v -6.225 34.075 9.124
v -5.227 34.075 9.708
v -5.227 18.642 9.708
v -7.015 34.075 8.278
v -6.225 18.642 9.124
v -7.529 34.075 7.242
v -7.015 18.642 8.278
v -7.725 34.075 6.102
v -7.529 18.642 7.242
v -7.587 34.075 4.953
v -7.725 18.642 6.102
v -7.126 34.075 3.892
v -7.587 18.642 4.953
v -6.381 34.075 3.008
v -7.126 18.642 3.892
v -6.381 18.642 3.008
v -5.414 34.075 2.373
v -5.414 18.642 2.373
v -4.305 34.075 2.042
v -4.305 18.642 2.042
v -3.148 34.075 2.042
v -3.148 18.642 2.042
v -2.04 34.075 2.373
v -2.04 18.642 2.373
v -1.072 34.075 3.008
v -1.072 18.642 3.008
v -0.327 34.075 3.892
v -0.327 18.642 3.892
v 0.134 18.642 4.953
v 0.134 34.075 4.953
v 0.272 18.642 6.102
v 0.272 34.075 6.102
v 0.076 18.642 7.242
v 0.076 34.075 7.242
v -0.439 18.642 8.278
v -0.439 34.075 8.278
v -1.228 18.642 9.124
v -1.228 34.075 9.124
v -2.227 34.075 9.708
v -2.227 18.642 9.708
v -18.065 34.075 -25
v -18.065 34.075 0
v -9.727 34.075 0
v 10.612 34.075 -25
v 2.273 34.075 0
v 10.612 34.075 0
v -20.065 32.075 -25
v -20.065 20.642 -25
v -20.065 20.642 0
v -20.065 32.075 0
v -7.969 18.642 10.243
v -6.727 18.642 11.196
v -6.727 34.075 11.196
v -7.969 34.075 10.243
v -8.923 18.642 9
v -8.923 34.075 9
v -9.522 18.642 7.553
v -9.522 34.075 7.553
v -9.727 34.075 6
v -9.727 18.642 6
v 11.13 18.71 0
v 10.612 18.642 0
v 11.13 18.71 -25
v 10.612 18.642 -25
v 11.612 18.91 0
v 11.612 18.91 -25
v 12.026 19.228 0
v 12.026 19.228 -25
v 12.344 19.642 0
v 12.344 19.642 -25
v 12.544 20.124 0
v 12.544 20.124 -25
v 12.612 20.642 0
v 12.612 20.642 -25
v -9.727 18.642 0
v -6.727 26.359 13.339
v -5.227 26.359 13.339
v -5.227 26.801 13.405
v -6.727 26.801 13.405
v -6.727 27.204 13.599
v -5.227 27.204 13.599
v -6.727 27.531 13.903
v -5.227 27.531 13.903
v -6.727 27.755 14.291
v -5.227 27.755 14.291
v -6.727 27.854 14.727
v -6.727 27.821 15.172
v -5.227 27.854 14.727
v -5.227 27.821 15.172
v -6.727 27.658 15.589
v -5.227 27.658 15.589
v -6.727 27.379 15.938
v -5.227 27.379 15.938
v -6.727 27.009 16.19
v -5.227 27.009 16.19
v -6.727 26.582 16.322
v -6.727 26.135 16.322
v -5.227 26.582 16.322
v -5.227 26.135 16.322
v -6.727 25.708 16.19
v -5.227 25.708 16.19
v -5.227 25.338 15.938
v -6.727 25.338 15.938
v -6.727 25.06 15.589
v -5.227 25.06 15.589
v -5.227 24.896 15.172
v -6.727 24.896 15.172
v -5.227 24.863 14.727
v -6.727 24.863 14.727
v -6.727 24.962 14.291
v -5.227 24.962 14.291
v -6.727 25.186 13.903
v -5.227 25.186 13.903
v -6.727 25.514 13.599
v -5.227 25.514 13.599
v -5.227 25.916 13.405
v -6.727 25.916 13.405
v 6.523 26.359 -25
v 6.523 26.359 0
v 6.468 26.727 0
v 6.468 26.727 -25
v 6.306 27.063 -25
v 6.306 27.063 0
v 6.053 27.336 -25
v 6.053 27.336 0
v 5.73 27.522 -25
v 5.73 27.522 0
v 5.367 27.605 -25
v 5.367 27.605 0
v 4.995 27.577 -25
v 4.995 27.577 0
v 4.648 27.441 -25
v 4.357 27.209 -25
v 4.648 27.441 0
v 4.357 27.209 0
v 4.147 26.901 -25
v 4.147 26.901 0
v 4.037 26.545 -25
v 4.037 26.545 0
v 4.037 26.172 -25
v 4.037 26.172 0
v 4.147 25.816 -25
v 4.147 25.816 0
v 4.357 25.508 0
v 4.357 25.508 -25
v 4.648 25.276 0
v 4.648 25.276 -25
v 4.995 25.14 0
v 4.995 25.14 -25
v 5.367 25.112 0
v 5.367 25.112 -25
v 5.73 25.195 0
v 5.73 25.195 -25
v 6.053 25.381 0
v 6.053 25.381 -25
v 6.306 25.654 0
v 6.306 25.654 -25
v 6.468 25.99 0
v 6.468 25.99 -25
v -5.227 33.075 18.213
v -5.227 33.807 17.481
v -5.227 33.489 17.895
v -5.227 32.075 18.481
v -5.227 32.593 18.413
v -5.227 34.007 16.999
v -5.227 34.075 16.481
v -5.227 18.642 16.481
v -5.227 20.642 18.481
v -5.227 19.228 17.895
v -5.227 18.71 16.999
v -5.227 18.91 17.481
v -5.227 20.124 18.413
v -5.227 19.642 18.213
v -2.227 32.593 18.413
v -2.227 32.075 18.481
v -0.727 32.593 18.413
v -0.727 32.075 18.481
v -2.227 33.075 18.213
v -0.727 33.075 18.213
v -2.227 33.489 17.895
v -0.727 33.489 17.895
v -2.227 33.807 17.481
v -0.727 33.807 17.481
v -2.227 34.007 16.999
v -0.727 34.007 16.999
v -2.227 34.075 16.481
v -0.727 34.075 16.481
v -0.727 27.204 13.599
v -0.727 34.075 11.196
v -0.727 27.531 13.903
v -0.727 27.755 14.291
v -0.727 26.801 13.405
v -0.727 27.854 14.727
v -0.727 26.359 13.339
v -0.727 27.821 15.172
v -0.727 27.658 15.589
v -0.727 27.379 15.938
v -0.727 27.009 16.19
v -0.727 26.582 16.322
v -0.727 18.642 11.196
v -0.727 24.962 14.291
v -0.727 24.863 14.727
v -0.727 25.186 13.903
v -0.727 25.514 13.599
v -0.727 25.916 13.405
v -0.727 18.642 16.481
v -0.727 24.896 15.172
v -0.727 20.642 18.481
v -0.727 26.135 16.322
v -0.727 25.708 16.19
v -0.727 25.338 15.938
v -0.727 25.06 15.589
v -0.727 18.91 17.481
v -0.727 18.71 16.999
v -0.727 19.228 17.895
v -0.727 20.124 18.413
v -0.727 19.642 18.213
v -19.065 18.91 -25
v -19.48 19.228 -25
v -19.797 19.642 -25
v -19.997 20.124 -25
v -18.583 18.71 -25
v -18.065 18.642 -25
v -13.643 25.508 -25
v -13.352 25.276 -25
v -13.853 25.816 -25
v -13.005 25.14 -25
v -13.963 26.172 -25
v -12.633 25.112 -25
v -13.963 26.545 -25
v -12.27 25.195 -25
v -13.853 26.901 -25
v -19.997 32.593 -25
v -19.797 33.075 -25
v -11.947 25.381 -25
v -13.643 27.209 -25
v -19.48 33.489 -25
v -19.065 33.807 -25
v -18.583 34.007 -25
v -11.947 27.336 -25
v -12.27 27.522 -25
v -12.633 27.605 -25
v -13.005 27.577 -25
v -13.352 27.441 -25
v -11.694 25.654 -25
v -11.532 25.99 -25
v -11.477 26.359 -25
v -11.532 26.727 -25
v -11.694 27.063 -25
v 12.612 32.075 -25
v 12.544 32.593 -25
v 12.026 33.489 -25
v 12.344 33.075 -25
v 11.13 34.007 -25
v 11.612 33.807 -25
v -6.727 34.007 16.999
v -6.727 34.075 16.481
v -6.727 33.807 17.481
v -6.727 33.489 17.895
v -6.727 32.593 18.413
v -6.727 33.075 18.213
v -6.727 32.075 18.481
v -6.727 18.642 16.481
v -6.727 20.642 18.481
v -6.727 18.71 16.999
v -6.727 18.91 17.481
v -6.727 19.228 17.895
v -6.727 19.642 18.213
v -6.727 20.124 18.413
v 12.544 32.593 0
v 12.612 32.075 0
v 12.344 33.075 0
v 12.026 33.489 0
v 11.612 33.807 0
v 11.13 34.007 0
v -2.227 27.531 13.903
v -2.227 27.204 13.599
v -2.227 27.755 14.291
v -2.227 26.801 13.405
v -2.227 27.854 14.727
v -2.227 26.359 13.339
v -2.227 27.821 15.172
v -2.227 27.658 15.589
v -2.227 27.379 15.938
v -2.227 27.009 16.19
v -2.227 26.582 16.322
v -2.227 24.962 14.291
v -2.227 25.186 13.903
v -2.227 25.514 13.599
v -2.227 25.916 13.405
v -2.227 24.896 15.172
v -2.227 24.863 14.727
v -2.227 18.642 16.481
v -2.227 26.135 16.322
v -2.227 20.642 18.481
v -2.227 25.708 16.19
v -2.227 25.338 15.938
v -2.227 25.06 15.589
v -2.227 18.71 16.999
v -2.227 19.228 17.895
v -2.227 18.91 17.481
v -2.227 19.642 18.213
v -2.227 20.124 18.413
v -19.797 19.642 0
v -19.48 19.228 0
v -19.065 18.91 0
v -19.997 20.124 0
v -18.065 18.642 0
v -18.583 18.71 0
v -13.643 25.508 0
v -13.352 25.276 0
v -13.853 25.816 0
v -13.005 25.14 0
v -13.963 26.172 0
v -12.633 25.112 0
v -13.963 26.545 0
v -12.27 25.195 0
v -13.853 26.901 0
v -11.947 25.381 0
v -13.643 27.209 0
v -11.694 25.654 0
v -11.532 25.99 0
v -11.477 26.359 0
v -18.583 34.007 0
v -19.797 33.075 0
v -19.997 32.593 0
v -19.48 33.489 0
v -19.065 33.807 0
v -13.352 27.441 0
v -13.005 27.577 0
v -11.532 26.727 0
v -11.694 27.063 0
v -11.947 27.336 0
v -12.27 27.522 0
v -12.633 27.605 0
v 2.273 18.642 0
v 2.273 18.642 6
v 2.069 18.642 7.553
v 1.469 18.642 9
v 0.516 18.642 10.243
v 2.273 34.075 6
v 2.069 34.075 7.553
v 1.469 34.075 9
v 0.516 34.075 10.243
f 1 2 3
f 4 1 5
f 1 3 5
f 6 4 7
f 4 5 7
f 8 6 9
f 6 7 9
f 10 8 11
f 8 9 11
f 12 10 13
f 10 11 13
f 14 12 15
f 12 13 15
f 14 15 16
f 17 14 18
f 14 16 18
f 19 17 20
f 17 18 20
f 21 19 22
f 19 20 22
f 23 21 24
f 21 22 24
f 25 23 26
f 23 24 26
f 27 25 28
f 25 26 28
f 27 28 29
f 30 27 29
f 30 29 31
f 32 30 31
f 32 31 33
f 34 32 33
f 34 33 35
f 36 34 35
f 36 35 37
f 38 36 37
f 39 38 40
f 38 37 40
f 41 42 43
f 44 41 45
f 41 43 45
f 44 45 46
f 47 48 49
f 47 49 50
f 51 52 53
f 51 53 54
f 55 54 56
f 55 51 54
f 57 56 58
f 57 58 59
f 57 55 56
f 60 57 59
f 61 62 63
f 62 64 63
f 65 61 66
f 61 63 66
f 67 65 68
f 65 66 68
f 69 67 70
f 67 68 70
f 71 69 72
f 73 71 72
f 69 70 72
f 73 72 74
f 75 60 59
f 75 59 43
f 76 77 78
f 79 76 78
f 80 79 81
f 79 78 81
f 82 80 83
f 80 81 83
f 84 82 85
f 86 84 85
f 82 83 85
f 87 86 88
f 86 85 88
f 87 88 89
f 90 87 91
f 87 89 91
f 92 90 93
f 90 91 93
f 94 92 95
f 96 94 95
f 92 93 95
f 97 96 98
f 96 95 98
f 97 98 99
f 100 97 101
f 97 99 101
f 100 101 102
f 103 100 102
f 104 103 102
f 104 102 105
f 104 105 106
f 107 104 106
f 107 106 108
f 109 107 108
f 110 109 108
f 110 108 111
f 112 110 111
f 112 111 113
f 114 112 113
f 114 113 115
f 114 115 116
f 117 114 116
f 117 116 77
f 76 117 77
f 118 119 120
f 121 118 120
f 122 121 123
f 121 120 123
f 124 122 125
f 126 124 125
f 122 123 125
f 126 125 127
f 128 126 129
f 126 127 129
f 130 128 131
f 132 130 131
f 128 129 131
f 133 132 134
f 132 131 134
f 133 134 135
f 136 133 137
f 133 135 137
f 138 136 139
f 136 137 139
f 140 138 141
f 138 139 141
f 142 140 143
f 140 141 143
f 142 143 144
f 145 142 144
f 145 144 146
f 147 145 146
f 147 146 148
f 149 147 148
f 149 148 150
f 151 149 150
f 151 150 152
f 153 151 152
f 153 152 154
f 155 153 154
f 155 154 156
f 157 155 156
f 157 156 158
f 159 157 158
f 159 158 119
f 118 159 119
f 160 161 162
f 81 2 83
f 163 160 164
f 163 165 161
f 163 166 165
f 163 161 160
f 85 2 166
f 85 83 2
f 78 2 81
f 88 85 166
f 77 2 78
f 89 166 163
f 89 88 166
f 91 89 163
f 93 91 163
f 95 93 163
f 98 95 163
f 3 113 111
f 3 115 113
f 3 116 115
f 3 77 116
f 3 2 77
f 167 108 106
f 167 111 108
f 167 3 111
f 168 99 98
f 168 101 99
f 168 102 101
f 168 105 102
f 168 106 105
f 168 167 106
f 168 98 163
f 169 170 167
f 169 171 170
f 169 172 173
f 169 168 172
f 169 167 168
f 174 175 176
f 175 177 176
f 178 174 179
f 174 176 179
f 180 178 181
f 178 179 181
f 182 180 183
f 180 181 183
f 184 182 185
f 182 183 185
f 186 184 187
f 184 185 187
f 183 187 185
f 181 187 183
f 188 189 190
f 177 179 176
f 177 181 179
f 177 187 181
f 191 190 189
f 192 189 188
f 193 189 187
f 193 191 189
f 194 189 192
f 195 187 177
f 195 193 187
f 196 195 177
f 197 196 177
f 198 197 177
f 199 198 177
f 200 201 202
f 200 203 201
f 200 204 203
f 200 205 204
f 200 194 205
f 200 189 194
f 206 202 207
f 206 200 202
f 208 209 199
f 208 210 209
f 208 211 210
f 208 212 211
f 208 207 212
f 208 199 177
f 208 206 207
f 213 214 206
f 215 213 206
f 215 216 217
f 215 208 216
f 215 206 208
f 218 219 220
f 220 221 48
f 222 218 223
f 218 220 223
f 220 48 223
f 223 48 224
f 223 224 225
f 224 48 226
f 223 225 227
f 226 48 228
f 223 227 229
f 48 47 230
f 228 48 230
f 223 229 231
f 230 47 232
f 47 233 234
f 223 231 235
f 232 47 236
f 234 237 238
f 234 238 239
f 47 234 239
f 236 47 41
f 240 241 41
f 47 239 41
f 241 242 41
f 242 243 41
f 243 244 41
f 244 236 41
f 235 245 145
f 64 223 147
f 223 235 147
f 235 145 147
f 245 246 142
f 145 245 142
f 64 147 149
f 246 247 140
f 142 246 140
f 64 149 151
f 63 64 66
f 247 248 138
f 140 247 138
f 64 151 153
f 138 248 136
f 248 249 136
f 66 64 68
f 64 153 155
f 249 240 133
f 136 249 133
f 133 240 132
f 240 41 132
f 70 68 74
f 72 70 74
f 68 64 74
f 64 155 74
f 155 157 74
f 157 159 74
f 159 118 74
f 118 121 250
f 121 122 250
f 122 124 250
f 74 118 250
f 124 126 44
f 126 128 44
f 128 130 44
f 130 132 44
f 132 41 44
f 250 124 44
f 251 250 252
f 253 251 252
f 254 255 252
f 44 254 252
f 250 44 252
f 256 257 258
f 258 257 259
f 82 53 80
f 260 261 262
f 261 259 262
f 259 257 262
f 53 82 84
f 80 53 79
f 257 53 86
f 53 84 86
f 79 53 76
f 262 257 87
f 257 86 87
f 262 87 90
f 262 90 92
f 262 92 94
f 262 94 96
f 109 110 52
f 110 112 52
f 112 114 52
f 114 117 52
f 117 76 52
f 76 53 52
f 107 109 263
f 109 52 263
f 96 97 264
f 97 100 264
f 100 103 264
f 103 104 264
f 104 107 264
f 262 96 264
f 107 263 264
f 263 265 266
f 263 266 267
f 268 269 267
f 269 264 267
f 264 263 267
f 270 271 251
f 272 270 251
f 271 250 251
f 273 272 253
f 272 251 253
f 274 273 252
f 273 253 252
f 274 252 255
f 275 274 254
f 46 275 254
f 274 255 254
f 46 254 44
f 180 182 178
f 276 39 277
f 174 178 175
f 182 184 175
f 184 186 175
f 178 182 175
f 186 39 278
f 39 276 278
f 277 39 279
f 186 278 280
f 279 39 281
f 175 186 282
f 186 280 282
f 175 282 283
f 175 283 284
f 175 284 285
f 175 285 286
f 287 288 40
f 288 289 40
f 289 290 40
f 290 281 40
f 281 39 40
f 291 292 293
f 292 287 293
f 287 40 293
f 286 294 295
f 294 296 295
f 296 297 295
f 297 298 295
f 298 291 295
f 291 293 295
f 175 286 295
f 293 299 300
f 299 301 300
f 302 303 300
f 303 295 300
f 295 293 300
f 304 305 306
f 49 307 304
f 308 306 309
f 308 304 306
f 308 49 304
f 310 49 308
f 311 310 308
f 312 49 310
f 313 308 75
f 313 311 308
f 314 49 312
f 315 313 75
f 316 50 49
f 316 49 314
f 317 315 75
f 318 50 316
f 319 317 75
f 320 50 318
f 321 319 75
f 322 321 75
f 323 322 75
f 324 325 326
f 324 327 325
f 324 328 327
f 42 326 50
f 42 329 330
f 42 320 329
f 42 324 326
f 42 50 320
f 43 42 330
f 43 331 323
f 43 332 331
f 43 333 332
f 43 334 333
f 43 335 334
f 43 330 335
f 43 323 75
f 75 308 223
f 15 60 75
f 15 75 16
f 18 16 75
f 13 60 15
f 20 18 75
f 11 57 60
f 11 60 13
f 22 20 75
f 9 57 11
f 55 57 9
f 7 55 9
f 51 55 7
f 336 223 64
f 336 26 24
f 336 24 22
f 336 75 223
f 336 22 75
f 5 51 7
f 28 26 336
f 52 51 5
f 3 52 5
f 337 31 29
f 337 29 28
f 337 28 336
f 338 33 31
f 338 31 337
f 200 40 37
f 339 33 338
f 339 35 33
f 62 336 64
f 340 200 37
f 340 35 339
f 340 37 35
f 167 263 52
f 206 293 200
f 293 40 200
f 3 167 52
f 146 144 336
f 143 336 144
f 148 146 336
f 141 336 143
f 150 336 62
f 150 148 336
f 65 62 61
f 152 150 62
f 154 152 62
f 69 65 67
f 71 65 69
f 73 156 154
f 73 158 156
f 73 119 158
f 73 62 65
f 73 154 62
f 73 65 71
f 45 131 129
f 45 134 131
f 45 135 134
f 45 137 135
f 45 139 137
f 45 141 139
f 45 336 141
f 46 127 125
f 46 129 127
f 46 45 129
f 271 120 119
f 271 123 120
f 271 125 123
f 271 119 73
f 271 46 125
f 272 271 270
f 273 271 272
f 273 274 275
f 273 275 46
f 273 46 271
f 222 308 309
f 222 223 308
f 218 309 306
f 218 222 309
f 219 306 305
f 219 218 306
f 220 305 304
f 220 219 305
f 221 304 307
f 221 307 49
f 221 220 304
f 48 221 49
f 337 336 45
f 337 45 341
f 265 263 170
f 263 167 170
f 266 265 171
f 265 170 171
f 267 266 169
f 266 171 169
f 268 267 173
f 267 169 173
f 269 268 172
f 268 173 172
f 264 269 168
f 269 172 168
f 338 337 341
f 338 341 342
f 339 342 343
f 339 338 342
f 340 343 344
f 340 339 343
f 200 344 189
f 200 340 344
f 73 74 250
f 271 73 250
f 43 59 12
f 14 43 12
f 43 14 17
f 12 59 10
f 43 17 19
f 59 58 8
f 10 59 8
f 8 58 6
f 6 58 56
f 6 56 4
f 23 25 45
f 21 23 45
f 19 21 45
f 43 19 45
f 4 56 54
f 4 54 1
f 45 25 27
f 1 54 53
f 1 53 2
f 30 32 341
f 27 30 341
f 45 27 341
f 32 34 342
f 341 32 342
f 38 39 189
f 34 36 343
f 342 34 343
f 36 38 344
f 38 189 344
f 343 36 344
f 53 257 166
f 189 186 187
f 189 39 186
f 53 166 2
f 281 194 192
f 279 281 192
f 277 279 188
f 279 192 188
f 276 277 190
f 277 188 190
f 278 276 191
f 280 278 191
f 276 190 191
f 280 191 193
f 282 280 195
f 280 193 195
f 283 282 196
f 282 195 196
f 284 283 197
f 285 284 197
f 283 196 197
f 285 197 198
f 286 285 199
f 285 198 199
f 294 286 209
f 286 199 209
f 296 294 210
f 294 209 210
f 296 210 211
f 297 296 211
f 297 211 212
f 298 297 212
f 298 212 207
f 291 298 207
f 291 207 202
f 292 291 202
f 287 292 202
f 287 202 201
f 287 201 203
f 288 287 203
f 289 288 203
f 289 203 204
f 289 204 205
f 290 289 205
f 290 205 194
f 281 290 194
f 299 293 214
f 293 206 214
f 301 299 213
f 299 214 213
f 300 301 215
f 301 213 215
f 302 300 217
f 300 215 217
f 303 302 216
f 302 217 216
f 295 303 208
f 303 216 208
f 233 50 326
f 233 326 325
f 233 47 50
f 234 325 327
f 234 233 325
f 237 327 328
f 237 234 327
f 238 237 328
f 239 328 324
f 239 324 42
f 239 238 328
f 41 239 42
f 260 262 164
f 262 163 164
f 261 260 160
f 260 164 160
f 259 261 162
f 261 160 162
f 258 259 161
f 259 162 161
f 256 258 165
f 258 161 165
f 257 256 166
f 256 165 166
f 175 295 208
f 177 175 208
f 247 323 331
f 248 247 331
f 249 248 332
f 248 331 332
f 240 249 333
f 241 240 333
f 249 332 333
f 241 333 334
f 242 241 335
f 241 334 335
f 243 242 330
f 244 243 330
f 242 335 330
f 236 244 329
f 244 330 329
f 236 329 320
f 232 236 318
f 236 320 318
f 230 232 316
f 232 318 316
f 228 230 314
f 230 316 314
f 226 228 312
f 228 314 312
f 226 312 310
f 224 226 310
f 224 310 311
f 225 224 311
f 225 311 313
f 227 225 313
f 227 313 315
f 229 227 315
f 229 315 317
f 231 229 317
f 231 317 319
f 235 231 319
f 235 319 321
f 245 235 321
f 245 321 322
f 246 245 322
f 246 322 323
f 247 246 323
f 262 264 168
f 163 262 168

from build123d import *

# Parameters (mm, degrees)
SKETCH_1_W          = 32.677388302
SKETCH_1_H          = 15.432977872
EXTRUDE_1_DEPTH     = 25
SKETCH_2_R          = 1.25
CUT_EXTRUDE_1_DEPTH = 26
SKETCH_3_R          = 6
EXTRUDE_2_DEPTH     = 15.432978
SKETCH_4_R          = 4
CUT_EXTRUDE_2_DEPTH = 16.432978
EXTRUDE_3_DEPTH     = 15.432978
SKETCH_6_W          = 6
SKETCH_6_H          = 8.481168663
EXTRUDE_4_DEPTH     = 15.432978
SKETCH_8_W          = 3
SKETCH_8_H          = 25.378391716
CUT_EXTRUDE_5_DEPTH = 16.432978
SKETCH_9_R          = 1.5
CUT_EXTRUDE_6_DEPTH = 20.338694151
FILLET_1_R          = 2
FILLET_2_R          = 2


with BuildPart() as part:
    # 草图1 → 凸台-拉伸1 (new body)
    with BuildSketch(Plane.XY):
        with Locations((-3.726697353, 26.358574689)):
            Rectangle(SKETCH_1_W, SKETCH_1_H)
    extrude(amount=-EXTRUDE_1_DEPTH)

    # 草图2 → 切除-拉伸1 (cut, through all)
    with BuildSketch(Plane.XY):
        with Locations((-12.726697353, 26.358574689)):
            Circle(SKETCH_2_R)
        with Locations((5.273302647, 26.358574689)):
            Circle(SKETCH_2_R)
    extrude(amount=-CUT_EXTRUDE_1_DEPTH, mode=Mode.SUBTRACT)



with BuildPart() as body_2:
    # 草图3 → 凸台-拉伸2 (new body)
    with BuildSketch(Plane.XZ.offset(-18.642085753)):
        with Locations((-3.726697353, 6)):
            Circle(SKETCH_3_R)
    extrude(amount=-EXTRUDE_2_DEPTH)

    # 草图4 → 切除-拉伸2 (cut, through all)
    with BuildSketch(Plane.XZ.offset(-18.642085753)):
        with Locations((-3.726697353, 6)):
            Circle(SKETCH_4_R)
    extrude(amount=-CUT_EXTRUDE_2_DEPTH, mode=Mode.SUBTRACT)


with BuildPart() as part_1:
    add(part.part)

    add(body_2.part)  # 凸台-拉伸3 merges body 2
    # 草图5 → 凸台-拉伸3 (add)
    with BuildSketch(Plane.XZ.offset(-18.642085753)):
        Polygon((-3.726697353, 0), (-9.726697353, 6), (-9.726697353, 0), align=None)
        Polygon((2.273302647, 6), (-3.726697353, 0), (2.273302647, 0), align=None)
    extrude(amount=-EXTRUDE_3_DEPTH)

    # 草图6 → 凸台-拉伸4 (add)
    with BuildSketch(Plane.XZ.offset(-18.642085753)):
        with Locations((-3.726697353, 14.240584332)):
            Rectangle(SKETCH_6_W, SKETCH_6_H)
    extrude(amount=-EXTRUDE_4_DEPTH)

    # 草图8 → 切除-拉伸5 (cut, through all)
    with BuildSketch(Plane.XZ.offset(-18.642085753)):
        with Locations((-3.726697353, 18.689195858)):
            Rectangle(SKETCH_8_W, SKETCH_8_H)
    extrude(amount=-CUT_EXTRUDE_5_DEPTH, mode=Mode.SUBTRACT)

    # 草图9 → 切除-拉伸6 (cut, through all)
    with BuildSketch(Plane(origin=(-0.726697353, 0, 0), x_dir=(0, 0, -1), z_dir=(1, 0, 0))):
        with Locations((-14.838660543, 26.358574689)):
            Circle(SKETCH_9_R)
    extrude(amount=-CUT_EXTRUDE_6_DEPTH, mode=Mode.SUBTRACT)

    # 圆角1
    fillet_1_edges = [part_1.edges().sort_by_distance(p)[0] for p in [
        (12.611996798, 18.642085753, -12.5),
        (-20.065391504, 18.642085753, -12.5),
        (-20.065391504, 34.075063625, -12.5),
        (12.611996798, 34.075063625, -12.5),
    ]]
    fillet(fillet_1_edges, radius=FILLET_1_R)

    # 圆角2
    fillet_2_edges = [part_1.edges().sort_by_distance(p)[0] for p in [
        (-1.476697353, 18.642085753, 18.481168663),
        (-1.476697353, 34.075063753, 18.481168663),
        (-5.976697353, 34.075063753, 18.481168663),
        (-5.976697353, 18.642085753, 18.481168663),
    ]]
    fillet(fillet_2_edges, radius=FILLET_2_R)


solid = part_1.part
